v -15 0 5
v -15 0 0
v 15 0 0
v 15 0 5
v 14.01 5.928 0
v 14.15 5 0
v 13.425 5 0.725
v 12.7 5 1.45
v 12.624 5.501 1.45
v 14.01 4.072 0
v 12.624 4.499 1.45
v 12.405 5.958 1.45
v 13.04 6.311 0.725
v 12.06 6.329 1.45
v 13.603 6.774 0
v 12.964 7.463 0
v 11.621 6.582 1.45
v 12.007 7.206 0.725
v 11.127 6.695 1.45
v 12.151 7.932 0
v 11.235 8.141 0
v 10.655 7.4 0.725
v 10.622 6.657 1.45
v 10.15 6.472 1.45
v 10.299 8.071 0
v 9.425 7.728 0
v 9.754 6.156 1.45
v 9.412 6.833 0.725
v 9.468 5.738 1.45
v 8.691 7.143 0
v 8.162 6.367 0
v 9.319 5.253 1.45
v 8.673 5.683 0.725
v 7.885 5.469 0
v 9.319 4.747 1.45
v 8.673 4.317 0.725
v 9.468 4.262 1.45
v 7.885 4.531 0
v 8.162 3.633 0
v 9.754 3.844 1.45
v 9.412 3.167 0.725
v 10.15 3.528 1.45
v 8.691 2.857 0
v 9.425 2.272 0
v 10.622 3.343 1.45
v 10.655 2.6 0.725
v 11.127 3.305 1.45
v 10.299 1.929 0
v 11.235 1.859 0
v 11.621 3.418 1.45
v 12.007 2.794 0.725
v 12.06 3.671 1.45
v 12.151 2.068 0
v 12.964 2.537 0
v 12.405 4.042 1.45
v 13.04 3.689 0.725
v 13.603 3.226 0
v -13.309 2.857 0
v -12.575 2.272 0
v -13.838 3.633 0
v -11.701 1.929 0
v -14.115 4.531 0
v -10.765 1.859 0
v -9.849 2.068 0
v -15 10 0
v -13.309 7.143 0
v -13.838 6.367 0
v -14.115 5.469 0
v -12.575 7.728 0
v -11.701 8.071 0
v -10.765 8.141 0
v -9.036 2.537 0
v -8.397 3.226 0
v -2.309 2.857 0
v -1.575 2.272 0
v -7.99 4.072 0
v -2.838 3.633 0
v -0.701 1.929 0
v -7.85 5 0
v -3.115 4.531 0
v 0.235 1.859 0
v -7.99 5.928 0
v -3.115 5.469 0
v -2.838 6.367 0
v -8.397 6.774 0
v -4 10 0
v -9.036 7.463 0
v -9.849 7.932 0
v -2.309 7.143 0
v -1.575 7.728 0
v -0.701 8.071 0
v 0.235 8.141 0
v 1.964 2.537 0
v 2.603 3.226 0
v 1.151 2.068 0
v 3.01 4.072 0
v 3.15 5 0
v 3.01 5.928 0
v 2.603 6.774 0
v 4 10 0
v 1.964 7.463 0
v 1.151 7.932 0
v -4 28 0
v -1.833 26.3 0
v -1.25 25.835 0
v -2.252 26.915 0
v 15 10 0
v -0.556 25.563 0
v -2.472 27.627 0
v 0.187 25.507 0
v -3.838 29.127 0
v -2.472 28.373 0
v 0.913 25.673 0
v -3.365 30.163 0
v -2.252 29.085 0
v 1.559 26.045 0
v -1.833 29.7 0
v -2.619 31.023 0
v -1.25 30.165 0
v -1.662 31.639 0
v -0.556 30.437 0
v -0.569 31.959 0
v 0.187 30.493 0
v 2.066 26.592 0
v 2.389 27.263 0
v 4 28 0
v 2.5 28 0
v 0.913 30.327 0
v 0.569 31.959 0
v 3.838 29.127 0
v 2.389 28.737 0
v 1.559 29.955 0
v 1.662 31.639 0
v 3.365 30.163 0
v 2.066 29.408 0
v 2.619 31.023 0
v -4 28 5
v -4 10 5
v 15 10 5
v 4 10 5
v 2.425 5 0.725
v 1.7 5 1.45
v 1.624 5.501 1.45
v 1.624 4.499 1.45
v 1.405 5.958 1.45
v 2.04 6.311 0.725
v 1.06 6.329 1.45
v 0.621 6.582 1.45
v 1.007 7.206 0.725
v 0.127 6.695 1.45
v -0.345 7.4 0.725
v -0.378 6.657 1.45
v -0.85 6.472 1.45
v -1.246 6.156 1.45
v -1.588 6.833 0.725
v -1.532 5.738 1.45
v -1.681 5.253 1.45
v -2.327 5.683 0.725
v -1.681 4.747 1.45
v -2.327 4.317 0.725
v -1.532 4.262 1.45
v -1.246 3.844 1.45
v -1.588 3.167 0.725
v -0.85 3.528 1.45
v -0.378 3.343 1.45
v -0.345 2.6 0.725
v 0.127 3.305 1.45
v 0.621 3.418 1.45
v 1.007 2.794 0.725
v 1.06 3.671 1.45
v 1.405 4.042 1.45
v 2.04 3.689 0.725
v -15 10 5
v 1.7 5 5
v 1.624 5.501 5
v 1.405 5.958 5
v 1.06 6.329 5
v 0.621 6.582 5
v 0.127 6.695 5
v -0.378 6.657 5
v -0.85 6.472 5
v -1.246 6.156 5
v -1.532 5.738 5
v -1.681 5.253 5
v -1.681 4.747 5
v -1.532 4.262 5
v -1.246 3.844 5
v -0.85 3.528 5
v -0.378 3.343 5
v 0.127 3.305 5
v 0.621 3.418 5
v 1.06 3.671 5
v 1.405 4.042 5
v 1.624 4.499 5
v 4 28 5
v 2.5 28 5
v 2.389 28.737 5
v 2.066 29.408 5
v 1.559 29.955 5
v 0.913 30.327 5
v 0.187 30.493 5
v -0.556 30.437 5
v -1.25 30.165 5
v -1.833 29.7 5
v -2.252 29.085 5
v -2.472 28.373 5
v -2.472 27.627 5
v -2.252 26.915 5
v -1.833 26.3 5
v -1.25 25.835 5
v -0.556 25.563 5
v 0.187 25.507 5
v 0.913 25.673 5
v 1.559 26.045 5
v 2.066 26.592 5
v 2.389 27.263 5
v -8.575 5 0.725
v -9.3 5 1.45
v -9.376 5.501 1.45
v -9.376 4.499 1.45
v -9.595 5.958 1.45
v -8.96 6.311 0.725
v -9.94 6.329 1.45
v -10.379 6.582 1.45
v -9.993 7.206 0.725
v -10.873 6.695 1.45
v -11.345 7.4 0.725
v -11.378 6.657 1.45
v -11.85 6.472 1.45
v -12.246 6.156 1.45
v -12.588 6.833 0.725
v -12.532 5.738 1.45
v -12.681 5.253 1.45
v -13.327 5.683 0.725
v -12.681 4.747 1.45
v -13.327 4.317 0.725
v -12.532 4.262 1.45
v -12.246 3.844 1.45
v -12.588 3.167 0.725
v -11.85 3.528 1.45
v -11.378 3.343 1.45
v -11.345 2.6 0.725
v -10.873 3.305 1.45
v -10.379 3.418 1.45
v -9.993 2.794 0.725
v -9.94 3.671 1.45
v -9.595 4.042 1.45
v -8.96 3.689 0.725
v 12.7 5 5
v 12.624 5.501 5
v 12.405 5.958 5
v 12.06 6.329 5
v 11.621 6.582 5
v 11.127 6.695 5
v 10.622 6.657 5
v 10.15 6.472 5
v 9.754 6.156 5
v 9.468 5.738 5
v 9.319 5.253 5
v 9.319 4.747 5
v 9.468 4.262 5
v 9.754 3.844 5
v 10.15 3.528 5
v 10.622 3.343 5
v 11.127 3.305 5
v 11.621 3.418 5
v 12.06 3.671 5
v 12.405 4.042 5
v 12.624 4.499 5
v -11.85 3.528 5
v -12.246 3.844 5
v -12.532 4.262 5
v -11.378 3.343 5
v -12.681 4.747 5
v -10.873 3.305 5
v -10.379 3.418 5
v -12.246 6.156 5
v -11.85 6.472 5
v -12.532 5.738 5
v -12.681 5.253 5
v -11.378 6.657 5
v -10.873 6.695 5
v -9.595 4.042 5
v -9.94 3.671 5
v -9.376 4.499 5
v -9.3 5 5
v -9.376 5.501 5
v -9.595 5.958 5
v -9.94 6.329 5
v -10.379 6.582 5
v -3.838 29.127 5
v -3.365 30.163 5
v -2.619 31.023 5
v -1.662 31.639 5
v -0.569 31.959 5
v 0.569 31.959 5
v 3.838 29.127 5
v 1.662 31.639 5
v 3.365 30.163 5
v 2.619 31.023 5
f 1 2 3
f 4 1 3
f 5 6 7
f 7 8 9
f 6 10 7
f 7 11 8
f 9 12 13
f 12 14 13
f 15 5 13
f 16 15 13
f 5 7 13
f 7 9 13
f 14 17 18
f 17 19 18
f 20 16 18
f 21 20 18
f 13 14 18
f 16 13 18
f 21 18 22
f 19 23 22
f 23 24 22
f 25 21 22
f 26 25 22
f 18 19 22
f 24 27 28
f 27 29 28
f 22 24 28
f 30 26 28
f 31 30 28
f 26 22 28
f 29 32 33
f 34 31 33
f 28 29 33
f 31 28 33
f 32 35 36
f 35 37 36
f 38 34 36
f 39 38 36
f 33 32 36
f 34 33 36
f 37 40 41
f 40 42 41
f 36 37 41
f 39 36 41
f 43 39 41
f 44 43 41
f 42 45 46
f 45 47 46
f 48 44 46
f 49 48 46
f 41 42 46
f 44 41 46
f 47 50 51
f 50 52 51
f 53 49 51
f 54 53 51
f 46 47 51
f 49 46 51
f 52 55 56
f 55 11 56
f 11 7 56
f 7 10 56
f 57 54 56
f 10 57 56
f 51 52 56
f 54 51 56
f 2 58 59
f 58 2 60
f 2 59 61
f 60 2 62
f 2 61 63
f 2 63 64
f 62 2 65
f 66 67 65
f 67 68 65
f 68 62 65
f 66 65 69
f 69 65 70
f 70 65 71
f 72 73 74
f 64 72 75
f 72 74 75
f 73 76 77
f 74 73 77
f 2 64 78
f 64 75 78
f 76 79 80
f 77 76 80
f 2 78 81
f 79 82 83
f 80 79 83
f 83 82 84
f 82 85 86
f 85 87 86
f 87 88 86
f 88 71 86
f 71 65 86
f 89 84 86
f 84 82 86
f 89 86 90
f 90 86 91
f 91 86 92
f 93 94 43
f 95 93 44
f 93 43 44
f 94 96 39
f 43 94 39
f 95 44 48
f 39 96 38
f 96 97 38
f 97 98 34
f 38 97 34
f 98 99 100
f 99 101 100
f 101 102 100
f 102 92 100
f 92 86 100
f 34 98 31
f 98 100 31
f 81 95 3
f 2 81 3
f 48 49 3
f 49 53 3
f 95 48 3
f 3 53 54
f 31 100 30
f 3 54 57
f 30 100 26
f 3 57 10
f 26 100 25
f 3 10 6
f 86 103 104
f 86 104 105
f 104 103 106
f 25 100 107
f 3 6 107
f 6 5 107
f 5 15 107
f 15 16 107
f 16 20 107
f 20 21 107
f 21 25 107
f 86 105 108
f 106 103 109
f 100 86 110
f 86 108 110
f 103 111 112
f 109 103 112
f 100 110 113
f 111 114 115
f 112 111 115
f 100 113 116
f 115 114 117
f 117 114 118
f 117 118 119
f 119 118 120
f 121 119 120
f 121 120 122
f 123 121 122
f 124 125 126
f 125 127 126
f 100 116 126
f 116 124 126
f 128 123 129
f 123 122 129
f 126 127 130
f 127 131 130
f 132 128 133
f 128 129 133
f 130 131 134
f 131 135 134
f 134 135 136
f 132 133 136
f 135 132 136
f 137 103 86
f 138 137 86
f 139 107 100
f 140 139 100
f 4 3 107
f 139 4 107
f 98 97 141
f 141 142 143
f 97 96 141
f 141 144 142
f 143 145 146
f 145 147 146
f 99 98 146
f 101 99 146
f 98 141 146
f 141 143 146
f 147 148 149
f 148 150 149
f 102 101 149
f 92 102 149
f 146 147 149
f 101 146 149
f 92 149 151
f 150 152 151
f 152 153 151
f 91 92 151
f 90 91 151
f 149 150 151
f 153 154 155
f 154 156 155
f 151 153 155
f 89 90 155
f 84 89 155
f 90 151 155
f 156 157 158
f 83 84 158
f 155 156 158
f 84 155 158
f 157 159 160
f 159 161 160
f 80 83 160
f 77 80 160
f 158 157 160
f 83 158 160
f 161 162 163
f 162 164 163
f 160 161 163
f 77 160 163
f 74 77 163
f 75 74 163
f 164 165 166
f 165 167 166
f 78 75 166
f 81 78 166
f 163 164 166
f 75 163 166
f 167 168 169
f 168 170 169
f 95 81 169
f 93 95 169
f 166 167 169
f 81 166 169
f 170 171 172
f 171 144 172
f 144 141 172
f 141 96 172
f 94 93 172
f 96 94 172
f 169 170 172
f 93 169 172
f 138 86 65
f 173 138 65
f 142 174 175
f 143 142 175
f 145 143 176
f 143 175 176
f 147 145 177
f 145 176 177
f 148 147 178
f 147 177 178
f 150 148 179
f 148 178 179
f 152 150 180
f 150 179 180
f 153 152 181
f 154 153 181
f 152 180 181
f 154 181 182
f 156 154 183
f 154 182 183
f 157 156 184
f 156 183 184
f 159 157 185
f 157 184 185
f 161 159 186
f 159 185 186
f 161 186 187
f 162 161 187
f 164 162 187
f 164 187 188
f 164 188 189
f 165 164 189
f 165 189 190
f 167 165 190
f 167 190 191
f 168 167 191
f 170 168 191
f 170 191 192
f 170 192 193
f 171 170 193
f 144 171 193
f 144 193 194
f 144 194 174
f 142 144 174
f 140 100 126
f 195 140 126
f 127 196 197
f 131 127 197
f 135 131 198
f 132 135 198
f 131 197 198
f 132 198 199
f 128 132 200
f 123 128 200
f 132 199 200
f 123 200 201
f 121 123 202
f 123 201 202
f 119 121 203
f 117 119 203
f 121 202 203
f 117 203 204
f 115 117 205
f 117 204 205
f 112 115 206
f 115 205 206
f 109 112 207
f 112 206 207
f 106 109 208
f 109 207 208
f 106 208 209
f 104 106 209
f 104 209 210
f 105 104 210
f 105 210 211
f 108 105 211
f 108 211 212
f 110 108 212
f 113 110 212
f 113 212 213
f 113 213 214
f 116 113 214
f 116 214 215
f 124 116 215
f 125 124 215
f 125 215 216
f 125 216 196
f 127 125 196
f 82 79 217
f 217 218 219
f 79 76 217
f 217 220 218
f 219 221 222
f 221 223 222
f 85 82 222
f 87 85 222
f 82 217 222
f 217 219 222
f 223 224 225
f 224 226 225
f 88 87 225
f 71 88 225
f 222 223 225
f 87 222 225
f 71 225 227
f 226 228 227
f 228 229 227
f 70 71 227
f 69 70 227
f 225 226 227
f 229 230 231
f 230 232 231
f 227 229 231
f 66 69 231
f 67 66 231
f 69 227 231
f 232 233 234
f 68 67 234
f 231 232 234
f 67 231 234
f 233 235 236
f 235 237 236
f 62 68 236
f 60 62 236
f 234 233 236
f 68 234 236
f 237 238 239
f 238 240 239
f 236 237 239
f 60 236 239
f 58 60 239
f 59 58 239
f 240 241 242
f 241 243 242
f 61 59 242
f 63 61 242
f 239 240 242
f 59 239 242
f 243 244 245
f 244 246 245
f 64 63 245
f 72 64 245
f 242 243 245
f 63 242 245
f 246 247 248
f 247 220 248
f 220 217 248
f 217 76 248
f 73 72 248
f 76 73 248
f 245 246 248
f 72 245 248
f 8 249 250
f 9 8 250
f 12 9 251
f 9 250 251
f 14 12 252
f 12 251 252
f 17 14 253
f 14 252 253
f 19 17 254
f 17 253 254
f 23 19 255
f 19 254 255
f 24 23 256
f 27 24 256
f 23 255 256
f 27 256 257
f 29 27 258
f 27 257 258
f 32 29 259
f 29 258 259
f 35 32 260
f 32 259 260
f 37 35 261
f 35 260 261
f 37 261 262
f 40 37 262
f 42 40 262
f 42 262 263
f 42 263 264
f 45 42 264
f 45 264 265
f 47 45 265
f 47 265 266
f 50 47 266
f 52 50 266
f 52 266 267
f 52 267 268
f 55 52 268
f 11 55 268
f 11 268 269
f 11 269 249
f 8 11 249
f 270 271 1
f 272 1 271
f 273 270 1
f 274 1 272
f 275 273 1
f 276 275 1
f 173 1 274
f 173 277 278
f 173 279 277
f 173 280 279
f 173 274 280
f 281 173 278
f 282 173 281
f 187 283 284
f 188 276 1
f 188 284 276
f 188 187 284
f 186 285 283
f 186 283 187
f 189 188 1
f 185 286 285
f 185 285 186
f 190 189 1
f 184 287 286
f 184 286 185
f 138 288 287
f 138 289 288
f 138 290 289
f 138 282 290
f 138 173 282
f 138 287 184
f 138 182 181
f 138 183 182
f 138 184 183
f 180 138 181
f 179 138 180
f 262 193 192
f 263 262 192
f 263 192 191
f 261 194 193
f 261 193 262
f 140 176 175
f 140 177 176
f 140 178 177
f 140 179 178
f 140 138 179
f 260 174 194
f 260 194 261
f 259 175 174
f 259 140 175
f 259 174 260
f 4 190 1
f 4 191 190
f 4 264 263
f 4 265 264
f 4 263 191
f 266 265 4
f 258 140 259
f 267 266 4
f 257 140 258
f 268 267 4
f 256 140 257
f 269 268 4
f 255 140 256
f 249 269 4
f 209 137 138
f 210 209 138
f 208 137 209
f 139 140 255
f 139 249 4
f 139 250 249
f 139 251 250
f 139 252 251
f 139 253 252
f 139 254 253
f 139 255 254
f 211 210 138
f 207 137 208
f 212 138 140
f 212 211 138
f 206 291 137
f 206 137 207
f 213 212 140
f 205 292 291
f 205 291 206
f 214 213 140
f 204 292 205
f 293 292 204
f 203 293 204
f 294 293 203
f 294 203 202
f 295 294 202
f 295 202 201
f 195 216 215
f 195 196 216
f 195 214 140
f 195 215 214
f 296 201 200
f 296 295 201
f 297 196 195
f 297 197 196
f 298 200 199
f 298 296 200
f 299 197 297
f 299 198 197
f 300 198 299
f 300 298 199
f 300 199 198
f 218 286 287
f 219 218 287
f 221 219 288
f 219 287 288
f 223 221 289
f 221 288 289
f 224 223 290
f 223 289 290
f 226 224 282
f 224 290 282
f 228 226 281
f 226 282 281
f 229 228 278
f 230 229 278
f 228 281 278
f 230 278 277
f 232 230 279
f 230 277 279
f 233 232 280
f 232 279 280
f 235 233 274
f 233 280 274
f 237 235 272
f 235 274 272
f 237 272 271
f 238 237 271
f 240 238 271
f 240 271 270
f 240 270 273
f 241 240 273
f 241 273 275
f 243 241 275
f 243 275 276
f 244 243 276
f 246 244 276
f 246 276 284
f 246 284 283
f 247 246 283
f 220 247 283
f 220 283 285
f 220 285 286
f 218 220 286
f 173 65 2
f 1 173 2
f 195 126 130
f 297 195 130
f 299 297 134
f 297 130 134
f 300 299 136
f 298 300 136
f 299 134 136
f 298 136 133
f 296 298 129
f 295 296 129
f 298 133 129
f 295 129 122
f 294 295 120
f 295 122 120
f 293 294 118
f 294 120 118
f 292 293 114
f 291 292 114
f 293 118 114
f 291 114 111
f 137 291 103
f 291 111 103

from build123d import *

# Parameters (mm, degrees)
BOSS_EXTRUDE1_DEPTH                                 = 5
SKETCH2_R                                           = 2.5
CUT_EXTRUDE1_DEPTH                                  = 6
CSK_FOR_M3_COUNTERSUNK_FLAT_HEAD_SCREW1_D           = 3.4
CSK_FOR_M3_COUNTERSUNK_FLAT_HEAD_SCREW1_DEPTH       = 5
CSK_FOR_M3_COUNTERSUNK_FLAT_HEAD_SCREW1_CSINK_D     = 6.3
CSK_FOR_M3_COUNTERSUNK_FLAT_HEAD_SCREW1_CSINK_ANGLE = 90


with BuildPart() as part:
    # Sketch1 → Boss-Extrude1 (new body)
    with BuildSketch(Plane.XY):
        with BuildLine():
            Line((4, 10), (4, 28))
            ThreePointArc((4, 28), (0, 32), (-4, 28))
            Line((-4, 28), (-4, 10))
            Line((-4, 10), (-15, 10))
            Line((-15, 10), (-15, 0))
            Line((-15, 0), (15, 0))
            Line((15, 0), (15, 10))
            Line((15, 10), (4, 10))
        make_face()
    extrude(amount=BOSS_EXTRUDE1_DEPTH)

    # Sketch2 → Cut-Extrude1 (cut, through all)
    with BuildSketch(Plane.XY.offset(5)):
        with Locations((0, 28)):
            Circle(SKETCH2_R)
    extrude(amount=-CUT_EXTRUDE1_DEPTH, mode=Mode.SUBTRACT)

    # CSK for M3 Countersunk Flat Head Screw1
    with Locations(Plane(origin=(0, 0, 0), x_dir=(-1, 0, 0), z_dir=(0, 0, -1))):
        with Locations((0, 5), (11, 5), (-11, 5)):
            CounterSinkHole(CSK_FOR_M3_COUNTERSUNK_FLAT_HEAD_SCREW1_D / 2, CSK_FOR_M3_COUNTERSUNK_FLAT_HEAD_SCREW1_CSINK_D / 2, depth=CSK_FOR_M3_COUNTERSUNK_FLAT_HEAD_SCREW1_DEPTH, counter_sink_angle=CSK_FOR_M3_COUNTERSUNK_FLAT_HEAD_SCREW1_CSINK_ANGLE)


solid = part.part
